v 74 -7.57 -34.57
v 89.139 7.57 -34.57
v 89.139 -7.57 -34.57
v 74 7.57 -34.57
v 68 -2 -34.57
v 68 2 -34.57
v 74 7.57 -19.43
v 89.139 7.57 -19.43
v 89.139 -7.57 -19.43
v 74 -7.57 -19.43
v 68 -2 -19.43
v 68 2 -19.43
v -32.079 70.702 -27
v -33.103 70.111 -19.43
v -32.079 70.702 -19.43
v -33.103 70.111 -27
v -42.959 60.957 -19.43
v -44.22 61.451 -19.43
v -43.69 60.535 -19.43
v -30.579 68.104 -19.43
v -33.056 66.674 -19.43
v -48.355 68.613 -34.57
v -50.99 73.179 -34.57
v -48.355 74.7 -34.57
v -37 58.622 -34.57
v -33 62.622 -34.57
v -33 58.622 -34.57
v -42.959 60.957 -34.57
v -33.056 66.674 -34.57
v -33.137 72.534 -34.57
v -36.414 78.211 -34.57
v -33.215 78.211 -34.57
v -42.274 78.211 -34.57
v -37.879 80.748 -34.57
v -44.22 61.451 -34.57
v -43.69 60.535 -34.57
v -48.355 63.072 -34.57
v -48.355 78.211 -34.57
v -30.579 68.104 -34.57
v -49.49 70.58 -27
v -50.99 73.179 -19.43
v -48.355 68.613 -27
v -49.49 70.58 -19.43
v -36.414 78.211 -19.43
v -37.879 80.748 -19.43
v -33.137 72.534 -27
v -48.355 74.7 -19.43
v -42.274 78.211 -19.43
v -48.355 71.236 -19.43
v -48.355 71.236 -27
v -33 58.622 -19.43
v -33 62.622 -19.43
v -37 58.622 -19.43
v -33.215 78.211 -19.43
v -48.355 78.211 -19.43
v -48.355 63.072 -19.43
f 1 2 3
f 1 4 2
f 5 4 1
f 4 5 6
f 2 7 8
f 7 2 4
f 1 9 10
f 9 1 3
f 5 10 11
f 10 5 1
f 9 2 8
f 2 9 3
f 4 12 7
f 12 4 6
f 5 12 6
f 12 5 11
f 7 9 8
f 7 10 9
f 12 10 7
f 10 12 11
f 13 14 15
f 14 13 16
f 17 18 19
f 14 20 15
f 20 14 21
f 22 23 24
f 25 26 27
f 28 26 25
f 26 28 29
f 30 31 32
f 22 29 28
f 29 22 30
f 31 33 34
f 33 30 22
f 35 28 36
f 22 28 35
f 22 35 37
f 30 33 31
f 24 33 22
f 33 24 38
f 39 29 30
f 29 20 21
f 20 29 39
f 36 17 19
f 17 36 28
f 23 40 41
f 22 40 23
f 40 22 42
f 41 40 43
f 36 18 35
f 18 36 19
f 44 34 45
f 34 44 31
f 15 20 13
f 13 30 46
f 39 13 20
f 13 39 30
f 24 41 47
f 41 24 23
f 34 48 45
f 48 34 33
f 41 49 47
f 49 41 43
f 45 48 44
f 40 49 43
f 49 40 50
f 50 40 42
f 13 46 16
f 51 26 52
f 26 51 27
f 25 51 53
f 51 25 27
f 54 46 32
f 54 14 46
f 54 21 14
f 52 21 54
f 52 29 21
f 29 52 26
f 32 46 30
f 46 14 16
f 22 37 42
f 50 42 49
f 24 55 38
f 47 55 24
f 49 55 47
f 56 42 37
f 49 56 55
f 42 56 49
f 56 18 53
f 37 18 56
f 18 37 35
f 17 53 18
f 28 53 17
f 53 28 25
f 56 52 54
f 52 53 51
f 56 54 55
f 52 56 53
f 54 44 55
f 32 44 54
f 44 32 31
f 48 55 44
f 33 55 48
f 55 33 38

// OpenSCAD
// Isolated idler bracket test — for visual verification
include <config_v5_5.scad>
use <monolith_v5_5.scad>

$fn = 32;

// Render just the idler brackets + nearby junction for context
_all_idler_brackets();
